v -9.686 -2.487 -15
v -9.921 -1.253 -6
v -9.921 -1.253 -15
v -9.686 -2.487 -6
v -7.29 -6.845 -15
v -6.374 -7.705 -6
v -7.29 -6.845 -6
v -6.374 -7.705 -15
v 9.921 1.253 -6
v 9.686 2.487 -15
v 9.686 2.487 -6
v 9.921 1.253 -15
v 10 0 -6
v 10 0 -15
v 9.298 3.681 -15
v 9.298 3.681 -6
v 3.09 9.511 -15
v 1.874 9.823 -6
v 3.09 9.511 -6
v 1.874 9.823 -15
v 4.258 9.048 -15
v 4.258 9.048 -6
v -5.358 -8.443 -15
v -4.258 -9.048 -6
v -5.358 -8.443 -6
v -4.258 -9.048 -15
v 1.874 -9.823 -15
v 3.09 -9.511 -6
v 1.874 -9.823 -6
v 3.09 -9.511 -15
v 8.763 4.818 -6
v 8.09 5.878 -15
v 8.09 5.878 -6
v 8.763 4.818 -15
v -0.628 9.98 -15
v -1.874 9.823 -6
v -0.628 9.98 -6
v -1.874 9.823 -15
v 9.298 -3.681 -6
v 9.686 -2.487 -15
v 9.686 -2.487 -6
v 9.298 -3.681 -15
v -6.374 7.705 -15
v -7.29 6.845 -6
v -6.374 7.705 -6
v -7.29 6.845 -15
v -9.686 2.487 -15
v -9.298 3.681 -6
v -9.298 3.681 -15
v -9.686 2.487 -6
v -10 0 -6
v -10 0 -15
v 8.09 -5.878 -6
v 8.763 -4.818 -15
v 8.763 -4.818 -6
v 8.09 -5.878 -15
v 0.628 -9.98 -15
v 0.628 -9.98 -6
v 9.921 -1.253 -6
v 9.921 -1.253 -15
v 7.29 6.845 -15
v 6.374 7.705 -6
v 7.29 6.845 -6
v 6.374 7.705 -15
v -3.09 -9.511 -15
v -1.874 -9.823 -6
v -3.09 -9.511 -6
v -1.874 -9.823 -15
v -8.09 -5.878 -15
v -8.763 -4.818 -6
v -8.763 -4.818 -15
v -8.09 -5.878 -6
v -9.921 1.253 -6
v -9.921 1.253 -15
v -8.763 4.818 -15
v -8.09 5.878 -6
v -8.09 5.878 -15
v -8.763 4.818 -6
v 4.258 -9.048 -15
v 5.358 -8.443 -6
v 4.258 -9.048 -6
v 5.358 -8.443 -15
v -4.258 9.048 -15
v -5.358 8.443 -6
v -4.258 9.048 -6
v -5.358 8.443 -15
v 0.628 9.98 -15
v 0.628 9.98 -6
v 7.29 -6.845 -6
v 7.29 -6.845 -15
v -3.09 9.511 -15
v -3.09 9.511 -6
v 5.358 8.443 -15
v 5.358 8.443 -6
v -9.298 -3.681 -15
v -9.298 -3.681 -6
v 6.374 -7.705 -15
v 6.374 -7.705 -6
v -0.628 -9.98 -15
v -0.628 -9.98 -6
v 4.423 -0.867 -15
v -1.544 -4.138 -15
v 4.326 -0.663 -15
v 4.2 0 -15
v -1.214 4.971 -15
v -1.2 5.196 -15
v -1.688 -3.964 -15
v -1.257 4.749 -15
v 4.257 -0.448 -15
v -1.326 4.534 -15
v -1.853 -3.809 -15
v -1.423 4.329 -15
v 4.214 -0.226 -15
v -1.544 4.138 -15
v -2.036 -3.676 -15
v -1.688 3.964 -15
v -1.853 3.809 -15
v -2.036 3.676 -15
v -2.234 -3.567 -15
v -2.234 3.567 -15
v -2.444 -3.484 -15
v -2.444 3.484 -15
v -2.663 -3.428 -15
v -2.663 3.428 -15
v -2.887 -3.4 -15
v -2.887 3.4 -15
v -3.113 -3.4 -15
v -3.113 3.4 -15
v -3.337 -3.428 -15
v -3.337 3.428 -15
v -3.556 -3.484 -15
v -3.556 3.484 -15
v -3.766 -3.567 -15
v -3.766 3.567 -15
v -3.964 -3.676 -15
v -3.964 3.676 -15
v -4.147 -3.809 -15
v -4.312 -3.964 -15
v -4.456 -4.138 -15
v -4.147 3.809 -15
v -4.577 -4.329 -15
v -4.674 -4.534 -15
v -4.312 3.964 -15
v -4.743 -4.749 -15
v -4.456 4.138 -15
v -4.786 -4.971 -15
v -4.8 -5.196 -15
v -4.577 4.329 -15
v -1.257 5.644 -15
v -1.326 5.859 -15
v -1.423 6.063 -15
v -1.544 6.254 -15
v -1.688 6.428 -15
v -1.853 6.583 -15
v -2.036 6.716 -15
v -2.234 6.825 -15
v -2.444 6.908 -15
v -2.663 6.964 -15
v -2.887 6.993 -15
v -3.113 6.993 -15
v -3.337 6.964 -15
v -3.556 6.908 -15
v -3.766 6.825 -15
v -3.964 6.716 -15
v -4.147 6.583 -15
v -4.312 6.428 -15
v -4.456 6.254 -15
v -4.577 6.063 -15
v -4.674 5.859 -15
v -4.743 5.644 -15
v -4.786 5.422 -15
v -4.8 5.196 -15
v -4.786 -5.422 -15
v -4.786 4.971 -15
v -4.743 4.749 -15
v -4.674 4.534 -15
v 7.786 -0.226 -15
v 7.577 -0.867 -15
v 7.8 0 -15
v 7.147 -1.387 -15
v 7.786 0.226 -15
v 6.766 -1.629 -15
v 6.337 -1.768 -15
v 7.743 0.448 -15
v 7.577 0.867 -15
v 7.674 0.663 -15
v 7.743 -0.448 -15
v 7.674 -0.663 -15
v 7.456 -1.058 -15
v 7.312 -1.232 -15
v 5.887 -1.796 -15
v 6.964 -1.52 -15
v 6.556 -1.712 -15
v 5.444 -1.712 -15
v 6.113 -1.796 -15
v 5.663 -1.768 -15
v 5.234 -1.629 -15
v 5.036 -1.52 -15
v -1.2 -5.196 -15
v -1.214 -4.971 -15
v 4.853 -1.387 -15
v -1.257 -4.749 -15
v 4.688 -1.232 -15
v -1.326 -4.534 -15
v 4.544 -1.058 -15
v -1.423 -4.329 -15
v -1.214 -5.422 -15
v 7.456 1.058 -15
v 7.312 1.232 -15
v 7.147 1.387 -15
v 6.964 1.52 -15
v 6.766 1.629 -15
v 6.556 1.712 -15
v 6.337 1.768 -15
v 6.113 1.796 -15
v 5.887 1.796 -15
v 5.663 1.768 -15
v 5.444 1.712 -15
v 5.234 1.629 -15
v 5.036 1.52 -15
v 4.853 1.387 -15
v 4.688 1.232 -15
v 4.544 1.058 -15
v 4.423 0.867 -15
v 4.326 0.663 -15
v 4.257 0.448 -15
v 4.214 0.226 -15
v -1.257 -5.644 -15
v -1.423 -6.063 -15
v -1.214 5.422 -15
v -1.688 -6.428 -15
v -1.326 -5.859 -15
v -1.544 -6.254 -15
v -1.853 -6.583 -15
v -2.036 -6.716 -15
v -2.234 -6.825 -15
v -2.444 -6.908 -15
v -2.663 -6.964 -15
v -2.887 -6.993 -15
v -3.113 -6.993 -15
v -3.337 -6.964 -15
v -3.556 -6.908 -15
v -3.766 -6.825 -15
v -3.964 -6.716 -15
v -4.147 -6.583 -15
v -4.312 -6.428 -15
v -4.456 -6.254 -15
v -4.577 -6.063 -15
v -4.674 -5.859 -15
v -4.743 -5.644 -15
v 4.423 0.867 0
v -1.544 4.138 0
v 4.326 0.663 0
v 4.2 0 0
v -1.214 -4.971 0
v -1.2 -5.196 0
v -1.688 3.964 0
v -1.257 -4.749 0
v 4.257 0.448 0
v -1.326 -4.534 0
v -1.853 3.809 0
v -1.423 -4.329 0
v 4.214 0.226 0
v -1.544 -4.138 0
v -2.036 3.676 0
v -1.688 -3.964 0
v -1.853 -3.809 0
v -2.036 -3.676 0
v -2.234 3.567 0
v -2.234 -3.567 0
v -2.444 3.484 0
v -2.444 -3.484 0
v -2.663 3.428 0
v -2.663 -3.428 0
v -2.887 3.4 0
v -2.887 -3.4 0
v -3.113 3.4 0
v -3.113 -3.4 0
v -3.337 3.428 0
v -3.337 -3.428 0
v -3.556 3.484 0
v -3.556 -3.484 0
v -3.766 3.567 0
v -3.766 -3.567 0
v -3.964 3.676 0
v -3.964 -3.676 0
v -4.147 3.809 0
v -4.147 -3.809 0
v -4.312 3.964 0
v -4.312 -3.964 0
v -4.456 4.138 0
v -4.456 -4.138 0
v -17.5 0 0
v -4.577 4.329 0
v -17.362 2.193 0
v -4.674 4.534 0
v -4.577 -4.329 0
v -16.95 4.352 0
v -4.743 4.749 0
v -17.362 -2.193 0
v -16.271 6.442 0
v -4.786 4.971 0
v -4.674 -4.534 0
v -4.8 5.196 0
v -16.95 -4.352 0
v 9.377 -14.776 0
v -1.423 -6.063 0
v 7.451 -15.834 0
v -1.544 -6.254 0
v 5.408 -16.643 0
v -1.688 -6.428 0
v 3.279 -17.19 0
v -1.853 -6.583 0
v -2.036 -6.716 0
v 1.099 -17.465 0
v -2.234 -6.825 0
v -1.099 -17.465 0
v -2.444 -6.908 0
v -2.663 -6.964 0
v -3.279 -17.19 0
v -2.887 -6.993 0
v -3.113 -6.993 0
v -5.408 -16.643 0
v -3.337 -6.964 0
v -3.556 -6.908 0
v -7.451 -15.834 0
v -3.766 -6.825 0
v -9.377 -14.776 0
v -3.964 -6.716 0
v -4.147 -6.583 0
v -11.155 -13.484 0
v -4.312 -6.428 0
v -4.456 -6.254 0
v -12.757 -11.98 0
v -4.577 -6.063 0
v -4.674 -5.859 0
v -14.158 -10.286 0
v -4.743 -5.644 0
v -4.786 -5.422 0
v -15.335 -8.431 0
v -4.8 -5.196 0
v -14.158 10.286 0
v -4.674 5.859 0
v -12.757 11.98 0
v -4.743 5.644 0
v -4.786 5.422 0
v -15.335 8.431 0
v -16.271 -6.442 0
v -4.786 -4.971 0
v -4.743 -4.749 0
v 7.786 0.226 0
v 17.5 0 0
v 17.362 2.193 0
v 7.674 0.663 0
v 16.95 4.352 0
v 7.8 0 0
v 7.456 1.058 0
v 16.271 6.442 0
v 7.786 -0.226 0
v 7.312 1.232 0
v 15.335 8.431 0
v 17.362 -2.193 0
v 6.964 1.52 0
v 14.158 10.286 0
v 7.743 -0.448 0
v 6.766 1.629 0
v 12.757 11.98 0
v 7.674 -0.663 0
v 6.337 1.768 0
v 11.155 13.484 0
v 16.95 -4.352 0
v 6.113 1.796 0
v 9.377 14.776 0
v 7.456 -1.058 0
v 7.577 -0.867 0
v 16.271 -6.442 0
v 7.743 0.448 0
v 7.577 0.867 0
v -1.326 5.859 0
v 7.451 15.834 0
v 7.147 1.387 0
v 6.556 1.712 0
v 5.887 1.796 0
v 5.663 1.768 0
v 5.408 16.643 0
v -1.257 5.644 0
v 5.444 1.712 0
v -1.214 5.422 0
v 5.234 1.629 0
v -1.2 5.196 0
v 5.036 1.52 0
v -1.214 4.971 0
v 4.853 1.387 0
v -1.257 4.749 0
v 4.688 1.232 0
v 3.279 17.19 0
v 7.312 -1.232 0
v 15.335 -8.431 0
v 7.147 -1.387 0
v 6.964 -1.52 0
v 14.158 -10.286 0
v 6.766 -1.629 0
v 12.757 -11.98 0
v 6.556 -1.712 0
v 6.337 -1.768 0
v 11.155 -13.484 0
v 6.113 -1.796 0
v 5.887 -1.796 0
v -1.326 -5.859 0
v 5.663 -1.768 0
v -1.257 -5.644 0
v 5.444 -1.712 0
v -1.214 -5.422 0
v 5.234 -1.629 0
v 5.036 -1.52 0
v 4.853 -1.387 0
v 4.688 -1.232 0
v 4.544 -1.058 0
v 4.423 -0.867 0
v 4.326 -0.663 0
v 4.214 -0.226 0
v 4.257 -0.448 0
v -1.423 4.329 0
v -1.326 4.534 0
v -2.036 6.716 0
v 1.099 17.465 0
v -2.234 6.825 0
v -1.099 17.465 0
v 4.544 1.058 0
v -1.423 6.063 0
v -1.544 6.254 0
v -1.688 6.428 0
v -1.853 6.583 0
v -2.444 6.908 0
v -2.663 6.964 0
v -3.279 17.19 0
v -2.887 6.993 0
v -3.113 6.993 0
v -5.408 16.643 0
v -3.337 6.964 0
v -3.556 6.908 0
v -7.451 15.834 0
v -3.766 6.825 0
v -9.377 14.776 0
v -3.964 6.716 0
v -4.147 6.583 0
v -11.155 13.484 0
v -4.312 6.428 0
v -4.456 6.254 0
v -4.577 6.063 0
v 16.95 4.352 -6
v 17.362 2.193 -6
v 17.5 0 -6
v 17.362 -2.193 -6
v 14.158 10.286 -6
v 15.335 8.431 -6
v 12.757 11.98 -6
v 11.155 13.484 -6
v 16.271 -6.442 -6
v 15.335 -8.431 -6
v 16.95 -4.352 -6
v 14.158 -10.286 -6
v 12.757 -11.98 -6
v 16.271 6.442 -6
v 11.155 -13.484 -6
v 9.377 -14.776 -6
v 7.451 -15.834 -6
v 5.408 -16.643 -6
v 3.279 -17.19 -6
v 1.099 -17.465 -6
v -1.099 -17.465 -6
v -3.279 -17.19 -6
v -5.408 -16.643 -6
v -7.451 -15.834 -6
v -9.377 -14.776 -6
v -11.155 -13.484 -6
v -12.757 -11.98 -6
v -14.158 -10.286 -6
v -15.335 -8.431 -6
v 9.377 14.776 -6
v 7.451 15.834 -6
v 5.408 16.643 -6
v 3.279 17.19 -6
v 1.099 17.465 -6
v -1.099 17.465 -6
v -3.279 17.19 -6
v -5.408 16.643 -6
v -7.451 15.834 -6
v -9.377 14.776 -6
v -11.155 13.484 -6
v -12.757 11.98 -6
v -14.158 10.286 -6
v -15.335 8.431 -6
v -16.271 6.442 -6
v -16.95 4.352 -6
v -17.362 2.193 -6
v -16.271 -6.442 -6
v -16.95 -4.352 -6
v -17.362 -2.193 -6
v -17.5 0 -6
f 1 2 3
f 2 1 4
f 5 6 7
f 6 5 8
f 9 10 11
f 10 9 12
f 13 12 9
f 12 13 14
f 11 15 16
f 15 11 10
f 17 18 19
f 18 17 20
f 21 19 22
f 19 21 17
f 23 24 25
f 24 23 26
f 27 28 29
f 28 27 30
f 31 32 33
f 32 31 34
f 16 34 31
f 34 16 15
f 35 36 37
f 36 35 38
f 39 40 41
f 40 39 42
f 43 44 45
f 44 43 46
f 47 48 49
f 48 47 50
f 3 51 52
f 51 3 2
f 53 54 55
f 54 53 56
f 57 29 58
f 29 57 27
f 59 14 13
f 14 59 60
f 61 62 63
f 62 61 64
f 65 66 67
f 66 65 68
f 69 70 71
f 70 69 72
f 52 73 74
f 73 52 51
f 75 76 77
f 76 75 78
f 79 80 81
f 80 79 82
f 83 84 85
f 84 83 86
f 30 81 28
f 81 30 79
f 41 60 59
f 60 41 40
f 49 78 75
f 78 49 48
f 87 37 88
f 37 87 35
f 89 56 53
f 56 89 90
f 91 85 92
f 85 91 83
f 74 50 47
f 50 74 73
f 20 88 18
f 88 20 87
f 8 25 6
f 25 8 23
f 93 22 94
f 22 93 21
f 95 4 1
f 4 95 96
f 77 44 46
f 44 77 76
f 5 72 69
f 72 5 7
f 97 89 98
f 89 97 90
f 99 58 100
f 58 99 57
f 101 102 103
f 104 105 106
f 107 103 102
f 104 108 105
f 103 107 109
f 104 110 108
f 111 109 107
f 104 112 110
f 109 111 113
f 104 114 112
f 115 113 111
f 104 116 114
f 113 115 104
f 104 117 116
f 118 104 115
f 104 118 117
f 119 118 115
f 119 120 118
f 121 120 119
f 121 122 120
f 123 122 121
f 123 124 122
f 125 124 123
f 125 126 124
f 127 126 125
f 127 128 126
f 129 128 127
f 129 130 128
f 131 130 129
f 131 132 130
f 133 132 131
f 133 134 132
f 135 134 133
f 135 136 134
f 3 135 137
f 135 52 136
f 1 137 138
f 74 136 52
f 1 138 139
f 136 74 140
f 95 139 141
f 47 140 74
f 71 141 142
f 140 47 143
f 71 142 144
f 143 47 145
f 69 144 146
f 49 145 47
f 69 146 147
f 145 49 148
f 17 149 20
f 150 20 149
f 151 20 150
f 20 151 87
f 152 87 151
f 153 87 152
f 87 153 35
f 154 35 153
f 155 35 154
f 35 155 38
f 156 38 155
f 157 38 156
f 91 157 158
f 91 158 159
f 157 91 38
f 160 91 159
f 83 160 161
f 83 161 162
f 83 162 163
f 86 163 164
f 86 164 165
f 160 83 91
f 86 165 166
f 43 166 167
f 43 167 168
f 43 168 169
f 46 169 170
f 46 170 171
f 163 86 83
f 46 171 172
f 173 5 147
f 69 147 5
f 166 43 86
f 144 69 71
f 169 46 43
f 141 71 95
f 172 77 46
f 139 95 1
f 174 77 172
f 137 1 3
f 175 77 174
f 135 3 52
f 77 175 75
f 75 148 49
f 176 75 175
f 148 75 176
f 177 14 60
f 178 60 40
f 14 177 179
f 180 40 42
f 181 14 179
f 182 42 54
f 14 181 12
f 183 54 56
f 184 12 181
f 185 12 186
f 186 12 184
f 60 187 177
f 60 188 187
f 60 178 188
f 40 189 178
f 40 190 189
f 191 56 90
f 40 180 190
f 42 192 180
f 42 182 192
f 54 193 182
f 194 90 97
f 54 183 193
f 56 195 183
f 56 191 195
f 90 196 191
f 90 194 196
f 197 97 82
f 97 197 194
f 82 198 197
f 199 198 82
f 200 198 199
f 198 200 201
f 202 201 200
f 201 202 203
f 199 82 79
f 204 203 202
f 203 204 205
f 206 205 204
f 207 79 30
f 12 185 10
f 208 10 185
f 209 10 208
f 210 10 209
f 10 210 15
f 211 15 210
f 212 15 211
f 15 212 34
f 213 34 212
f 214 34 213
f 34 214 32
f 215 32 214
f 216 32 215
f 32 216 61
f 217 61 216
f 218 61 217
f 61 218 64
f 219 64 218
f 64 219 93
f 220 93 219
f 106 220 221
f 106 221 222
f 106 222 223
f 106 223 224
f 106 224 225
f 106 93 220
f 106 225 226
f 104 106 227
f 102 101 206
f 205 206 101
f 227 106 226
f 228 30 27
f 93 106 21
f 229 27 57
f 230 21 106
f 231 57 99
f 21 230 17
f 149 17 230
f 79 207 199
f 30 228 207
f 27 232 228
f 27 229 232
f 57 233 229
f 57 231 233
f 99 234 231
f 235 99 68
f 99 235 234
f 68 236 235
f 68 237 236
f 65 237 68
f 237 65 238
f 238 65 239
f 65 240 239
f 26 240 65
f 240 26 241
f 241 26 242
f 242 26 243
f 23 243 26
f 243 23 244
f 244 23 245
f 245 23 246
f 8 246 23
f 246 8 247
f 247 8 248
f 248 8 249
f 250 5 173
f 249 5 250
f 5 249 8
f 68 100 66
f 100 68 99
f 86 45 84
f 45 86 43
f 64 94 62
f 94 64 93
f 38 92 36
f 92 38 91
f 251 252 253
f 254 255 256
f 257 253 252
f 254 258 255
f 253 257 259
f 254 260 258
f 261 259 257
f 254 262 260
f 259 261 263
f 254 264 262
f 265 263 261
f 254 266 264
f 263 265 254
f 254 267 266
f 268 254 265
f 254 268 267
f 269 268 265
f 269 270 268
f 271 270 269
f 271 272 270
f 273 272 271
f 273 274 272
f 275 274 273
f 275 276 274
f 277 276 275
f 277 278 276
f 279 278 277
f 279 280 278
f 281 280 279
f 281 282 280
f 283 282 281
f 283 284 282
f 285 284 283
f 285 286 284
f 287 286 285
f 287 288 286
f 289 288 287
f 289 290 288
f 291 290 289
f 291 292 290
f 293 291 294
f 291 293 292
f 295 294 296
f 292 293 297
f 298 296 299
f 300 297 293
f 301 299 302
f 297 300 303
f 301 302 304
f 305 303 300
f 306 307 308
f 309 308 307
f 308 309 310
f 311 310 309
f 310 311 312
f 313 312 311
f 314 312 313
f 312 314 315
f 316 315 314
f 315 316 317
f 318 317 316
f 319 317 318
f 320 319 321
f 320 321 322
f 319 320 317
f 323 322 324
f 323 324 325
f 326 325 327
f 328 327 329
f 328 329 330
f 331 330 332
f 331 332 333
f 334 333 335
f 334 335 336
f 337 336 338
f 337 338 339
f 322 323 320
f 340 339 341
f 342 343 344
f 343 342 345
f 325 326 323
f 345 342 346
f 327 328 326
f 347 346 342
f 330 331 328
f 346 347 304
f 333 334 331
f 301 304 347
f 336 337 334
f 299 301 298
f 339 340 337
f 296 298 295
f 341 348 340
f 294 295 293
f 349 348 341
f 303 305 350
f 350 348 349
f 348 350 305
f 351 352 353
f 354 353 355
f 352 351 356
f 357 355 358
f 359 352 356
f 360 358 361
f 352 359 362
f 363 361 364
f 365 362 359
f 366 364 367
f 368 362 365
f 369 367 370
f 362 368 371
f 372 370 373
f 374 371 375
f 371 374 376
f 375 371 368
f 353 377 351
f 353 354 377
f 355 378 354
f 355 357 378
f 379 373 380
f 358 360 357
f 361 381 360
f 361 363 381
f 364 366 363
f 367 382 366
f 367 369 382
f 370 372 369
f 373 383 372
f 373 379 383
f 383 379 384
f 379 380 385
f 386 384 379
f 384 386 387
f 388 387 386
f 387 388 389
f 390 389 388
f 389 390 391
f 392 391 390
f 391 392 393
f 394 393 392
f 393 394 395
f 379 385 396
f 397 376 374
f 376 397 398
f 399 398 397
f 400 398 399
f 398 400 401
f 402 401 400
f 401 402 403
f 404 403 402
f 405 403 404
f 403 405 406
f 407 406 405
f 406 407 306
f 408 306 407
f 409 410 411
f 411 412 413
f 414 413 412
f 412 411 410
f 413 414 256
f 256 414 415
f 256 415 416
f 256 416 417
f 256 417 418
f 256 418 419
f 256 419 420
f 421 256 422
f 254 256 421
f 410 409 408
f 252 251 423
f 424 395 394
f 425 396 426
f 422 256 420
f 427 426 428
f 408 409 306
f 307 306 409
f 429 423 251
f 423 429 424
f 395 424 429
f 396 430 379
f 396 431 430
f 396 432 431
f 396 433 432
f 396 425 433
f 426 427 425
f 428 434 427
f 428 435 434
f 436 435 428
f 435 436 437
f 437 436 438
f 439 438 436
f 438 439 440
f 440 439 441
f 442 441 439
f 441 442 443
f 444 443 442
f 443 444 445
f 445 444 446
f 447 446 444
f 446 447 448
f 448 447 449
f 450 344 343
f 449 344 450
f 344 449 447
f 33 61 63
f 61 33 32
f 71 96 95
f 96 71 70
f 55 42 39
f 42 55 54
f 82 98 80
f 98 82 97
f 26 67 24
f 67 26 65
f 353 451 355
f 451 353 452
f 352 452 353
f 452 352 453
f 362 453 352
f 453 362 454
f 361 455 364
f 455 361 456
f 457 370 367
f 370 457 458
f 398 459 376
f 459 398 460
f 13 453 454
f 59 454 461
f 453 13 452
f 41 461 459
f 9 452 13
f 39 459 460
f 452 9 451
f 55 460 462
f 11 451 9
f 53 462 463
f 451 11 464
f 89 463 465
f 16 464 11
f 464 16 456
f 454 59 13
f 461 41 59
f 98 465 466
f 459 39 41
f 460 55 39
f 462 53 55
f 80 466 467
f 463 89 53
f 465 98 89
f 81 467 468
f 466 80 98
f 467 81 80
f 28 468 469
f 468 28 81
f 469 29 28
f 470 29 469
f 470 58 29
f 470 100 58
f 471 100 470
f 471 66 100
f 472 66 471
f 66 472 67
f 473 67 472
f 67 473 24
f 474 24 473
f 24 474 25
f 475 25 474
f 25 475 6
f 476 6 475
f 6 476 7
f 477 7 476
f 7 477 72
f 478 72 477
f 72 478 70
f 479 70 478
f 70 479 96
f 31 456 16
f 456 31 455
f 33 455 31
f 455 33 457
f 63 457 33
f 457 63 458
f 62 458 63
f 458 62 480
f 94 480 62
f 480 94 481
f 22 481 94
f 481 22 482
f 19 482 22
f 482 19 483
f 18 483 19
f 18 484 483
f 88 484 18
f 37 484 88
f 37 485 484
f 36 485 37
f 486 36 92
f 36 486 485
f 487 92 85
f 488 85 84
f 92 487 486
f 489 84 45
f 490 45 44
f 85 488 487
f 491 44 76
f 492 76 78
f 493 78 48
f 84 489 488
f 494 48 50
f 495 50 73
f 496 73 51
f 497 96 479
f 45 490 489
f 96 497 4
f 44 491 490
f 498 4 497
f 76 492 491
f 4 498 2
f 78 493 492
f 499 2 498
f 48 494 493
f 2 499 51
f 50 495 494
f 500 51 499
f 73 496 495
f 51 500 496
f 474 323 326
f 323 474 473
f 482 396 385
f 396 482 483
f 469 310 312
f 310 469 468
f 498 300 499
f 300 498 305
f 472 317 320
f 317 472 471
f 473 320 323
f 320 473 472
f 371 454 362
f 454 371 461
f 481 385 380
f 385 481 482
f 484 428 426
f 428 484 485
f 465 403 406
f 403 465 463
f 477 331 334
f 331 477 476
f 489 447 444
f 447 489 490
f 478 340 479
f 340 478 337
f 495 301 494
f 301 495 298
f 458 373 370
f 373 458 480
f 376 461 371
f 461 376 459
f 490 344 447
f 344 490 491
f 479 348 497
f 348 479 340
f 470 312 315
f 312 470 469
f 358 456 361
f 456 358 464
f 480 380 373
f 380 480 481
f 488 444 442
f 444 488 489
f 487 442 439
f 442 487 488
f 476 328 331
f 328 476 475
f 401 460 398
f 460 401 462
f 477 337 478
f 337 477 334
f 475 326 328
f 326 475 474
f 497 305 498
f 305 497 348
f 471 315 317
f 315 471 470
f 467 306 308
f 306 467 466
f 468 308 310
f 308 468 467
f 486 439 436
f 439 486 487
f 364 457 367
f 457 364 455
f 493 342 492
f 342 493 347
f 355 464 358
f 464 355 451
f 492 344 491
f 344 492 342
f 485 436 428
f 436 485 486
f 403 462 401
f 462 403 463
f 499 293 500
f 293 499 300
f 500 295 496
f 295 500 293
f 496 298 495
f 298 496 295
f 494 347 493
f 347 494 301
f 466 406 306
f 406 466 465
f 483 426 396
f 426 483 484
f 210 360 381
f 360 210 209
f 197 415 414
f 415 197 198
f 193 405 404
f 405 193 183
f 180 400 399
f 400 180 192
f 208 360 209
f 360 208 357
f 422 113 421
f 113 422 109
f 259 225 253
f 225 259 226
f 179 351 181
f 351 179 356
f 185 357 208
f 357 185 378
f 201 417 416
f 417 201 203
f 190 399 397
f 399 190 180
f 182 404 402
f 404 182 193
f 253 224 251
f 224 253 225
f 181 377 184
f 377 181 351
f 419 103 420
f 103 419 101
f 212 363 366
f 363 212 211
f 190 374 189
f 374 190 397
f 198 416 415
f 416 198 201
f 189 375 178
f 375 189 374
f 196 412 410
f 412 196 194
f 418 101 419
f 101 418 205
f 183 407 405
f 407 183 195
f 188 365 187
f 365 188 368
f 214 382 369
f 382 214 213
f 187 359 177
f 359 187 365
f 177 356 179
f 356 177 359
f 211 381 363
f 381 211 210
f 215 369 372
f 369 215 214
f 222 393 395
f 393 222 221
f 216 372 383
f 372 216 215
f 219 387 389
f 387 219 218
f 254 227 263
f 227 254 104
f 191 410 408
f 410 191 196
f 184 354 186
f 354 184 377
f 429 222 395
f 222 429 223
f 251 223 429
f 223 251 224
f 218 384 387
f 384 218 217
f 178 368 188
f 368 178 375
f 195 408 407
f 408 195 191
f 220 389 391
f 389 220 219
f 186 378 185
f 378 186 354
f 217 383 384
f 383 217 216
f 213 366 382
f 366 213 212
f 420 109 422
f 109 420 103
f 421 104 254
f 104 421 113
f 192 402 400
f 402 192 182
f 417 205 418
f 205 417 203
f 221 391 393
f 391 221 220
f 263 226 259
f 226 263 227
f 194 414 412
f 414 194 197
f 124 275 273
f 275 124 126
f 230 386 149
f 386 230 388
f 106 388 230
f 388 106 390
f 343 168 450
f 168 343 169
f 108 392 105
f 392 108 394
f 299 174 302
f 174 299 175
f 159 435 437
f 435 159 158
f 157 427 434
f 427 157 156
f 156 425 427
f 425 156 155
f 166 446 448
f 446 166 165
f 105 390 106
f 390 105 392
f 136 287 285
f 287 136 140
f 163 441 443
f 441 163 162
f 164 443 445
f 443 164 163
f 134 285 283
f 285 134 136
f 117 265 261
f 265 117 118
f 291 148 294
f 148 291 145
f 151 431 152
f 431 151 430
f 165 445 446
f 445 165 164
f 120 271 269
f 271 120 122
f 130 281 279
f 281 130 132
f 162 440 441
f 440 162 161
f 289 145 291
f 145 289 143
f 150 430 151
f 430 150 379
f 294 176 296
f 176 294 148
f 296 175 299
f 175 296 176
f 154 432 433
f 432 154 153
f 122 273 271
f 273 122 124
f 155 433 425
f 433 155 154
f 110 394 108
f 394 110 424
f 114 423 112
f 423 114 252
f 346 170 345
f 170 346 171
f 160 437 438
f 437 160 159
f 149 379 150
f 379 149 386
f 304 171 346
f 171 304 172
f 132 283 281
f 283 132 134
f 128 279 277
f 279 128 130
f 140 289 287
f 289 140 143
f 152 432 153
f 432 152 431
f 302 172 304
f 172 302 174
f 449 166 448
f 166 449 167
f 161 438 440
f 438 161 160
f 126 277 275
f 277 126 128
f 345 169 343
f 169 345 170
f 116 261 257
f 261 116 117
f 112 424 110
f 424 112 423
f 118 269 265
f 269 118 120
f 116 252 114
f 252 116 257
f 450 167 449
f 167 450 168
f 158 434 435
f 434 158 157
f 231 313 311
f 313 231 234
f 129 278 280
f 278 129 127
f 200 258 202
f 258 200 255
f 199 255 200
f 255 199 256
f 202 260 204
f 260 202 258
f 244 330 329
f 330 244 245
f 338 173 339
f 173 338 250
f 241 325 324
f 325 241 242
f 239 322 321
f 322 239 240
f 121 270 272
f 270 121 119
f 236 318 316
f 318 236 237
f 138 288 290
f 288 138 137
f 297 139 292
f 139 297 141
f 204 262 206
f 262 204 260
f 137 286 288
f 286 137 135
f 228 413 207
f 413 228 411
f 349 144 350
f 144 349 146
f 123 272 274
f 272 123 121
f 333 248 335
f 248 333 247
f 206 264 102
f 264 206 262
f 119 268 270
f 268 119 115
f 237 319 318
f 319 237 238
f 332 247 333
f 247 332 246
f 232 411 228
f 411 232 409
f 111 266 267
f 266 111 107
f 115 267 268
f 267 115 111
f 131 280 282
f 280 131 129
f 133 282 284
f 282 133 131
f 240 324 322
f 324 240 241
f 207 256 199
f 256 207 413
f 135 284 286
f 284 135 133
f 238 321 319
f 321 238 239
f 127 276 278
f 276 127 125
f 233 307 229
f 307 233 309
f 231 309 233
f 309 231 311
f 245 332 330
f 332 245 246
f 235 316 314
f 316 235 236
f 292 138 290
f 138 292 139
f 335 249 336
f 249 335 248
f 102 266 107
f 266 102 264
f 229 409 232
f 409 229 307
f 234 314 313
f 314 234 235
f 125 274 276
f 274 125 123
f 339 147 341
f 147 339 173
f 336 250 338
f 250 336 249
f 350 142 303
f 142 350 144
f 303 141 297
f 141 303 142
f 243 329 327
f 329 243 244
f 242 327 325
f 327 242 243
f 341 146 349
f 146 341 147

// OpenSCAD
$fn = 50;


difference() {
	union() {
		translate(v = [0, 0, -15.0000000000]) {
			cylinder(h = 15, r = 10.0000000000);
		}
		translate(v = [0, 0, -6.0000000000]) {
			cylinder(h = 6, r = 17.5000000000);
		}
	}
	union() {
		#translate(v = [6.0000000000, 0.0000000000, -15]) {
			cylinder(h = 15, r = 1.8000000000);
		}
		#translate(v = [-3.0000000000, 5.1961524227, -15]) {
			cylinder(h = 15, r = 1.8000000000);
		}
		#translate(v = [-3.0000000000, -5.1961524227, -15]) {
			cylinder(h = 15, r = 1.8000000000);
		}
	}
}
